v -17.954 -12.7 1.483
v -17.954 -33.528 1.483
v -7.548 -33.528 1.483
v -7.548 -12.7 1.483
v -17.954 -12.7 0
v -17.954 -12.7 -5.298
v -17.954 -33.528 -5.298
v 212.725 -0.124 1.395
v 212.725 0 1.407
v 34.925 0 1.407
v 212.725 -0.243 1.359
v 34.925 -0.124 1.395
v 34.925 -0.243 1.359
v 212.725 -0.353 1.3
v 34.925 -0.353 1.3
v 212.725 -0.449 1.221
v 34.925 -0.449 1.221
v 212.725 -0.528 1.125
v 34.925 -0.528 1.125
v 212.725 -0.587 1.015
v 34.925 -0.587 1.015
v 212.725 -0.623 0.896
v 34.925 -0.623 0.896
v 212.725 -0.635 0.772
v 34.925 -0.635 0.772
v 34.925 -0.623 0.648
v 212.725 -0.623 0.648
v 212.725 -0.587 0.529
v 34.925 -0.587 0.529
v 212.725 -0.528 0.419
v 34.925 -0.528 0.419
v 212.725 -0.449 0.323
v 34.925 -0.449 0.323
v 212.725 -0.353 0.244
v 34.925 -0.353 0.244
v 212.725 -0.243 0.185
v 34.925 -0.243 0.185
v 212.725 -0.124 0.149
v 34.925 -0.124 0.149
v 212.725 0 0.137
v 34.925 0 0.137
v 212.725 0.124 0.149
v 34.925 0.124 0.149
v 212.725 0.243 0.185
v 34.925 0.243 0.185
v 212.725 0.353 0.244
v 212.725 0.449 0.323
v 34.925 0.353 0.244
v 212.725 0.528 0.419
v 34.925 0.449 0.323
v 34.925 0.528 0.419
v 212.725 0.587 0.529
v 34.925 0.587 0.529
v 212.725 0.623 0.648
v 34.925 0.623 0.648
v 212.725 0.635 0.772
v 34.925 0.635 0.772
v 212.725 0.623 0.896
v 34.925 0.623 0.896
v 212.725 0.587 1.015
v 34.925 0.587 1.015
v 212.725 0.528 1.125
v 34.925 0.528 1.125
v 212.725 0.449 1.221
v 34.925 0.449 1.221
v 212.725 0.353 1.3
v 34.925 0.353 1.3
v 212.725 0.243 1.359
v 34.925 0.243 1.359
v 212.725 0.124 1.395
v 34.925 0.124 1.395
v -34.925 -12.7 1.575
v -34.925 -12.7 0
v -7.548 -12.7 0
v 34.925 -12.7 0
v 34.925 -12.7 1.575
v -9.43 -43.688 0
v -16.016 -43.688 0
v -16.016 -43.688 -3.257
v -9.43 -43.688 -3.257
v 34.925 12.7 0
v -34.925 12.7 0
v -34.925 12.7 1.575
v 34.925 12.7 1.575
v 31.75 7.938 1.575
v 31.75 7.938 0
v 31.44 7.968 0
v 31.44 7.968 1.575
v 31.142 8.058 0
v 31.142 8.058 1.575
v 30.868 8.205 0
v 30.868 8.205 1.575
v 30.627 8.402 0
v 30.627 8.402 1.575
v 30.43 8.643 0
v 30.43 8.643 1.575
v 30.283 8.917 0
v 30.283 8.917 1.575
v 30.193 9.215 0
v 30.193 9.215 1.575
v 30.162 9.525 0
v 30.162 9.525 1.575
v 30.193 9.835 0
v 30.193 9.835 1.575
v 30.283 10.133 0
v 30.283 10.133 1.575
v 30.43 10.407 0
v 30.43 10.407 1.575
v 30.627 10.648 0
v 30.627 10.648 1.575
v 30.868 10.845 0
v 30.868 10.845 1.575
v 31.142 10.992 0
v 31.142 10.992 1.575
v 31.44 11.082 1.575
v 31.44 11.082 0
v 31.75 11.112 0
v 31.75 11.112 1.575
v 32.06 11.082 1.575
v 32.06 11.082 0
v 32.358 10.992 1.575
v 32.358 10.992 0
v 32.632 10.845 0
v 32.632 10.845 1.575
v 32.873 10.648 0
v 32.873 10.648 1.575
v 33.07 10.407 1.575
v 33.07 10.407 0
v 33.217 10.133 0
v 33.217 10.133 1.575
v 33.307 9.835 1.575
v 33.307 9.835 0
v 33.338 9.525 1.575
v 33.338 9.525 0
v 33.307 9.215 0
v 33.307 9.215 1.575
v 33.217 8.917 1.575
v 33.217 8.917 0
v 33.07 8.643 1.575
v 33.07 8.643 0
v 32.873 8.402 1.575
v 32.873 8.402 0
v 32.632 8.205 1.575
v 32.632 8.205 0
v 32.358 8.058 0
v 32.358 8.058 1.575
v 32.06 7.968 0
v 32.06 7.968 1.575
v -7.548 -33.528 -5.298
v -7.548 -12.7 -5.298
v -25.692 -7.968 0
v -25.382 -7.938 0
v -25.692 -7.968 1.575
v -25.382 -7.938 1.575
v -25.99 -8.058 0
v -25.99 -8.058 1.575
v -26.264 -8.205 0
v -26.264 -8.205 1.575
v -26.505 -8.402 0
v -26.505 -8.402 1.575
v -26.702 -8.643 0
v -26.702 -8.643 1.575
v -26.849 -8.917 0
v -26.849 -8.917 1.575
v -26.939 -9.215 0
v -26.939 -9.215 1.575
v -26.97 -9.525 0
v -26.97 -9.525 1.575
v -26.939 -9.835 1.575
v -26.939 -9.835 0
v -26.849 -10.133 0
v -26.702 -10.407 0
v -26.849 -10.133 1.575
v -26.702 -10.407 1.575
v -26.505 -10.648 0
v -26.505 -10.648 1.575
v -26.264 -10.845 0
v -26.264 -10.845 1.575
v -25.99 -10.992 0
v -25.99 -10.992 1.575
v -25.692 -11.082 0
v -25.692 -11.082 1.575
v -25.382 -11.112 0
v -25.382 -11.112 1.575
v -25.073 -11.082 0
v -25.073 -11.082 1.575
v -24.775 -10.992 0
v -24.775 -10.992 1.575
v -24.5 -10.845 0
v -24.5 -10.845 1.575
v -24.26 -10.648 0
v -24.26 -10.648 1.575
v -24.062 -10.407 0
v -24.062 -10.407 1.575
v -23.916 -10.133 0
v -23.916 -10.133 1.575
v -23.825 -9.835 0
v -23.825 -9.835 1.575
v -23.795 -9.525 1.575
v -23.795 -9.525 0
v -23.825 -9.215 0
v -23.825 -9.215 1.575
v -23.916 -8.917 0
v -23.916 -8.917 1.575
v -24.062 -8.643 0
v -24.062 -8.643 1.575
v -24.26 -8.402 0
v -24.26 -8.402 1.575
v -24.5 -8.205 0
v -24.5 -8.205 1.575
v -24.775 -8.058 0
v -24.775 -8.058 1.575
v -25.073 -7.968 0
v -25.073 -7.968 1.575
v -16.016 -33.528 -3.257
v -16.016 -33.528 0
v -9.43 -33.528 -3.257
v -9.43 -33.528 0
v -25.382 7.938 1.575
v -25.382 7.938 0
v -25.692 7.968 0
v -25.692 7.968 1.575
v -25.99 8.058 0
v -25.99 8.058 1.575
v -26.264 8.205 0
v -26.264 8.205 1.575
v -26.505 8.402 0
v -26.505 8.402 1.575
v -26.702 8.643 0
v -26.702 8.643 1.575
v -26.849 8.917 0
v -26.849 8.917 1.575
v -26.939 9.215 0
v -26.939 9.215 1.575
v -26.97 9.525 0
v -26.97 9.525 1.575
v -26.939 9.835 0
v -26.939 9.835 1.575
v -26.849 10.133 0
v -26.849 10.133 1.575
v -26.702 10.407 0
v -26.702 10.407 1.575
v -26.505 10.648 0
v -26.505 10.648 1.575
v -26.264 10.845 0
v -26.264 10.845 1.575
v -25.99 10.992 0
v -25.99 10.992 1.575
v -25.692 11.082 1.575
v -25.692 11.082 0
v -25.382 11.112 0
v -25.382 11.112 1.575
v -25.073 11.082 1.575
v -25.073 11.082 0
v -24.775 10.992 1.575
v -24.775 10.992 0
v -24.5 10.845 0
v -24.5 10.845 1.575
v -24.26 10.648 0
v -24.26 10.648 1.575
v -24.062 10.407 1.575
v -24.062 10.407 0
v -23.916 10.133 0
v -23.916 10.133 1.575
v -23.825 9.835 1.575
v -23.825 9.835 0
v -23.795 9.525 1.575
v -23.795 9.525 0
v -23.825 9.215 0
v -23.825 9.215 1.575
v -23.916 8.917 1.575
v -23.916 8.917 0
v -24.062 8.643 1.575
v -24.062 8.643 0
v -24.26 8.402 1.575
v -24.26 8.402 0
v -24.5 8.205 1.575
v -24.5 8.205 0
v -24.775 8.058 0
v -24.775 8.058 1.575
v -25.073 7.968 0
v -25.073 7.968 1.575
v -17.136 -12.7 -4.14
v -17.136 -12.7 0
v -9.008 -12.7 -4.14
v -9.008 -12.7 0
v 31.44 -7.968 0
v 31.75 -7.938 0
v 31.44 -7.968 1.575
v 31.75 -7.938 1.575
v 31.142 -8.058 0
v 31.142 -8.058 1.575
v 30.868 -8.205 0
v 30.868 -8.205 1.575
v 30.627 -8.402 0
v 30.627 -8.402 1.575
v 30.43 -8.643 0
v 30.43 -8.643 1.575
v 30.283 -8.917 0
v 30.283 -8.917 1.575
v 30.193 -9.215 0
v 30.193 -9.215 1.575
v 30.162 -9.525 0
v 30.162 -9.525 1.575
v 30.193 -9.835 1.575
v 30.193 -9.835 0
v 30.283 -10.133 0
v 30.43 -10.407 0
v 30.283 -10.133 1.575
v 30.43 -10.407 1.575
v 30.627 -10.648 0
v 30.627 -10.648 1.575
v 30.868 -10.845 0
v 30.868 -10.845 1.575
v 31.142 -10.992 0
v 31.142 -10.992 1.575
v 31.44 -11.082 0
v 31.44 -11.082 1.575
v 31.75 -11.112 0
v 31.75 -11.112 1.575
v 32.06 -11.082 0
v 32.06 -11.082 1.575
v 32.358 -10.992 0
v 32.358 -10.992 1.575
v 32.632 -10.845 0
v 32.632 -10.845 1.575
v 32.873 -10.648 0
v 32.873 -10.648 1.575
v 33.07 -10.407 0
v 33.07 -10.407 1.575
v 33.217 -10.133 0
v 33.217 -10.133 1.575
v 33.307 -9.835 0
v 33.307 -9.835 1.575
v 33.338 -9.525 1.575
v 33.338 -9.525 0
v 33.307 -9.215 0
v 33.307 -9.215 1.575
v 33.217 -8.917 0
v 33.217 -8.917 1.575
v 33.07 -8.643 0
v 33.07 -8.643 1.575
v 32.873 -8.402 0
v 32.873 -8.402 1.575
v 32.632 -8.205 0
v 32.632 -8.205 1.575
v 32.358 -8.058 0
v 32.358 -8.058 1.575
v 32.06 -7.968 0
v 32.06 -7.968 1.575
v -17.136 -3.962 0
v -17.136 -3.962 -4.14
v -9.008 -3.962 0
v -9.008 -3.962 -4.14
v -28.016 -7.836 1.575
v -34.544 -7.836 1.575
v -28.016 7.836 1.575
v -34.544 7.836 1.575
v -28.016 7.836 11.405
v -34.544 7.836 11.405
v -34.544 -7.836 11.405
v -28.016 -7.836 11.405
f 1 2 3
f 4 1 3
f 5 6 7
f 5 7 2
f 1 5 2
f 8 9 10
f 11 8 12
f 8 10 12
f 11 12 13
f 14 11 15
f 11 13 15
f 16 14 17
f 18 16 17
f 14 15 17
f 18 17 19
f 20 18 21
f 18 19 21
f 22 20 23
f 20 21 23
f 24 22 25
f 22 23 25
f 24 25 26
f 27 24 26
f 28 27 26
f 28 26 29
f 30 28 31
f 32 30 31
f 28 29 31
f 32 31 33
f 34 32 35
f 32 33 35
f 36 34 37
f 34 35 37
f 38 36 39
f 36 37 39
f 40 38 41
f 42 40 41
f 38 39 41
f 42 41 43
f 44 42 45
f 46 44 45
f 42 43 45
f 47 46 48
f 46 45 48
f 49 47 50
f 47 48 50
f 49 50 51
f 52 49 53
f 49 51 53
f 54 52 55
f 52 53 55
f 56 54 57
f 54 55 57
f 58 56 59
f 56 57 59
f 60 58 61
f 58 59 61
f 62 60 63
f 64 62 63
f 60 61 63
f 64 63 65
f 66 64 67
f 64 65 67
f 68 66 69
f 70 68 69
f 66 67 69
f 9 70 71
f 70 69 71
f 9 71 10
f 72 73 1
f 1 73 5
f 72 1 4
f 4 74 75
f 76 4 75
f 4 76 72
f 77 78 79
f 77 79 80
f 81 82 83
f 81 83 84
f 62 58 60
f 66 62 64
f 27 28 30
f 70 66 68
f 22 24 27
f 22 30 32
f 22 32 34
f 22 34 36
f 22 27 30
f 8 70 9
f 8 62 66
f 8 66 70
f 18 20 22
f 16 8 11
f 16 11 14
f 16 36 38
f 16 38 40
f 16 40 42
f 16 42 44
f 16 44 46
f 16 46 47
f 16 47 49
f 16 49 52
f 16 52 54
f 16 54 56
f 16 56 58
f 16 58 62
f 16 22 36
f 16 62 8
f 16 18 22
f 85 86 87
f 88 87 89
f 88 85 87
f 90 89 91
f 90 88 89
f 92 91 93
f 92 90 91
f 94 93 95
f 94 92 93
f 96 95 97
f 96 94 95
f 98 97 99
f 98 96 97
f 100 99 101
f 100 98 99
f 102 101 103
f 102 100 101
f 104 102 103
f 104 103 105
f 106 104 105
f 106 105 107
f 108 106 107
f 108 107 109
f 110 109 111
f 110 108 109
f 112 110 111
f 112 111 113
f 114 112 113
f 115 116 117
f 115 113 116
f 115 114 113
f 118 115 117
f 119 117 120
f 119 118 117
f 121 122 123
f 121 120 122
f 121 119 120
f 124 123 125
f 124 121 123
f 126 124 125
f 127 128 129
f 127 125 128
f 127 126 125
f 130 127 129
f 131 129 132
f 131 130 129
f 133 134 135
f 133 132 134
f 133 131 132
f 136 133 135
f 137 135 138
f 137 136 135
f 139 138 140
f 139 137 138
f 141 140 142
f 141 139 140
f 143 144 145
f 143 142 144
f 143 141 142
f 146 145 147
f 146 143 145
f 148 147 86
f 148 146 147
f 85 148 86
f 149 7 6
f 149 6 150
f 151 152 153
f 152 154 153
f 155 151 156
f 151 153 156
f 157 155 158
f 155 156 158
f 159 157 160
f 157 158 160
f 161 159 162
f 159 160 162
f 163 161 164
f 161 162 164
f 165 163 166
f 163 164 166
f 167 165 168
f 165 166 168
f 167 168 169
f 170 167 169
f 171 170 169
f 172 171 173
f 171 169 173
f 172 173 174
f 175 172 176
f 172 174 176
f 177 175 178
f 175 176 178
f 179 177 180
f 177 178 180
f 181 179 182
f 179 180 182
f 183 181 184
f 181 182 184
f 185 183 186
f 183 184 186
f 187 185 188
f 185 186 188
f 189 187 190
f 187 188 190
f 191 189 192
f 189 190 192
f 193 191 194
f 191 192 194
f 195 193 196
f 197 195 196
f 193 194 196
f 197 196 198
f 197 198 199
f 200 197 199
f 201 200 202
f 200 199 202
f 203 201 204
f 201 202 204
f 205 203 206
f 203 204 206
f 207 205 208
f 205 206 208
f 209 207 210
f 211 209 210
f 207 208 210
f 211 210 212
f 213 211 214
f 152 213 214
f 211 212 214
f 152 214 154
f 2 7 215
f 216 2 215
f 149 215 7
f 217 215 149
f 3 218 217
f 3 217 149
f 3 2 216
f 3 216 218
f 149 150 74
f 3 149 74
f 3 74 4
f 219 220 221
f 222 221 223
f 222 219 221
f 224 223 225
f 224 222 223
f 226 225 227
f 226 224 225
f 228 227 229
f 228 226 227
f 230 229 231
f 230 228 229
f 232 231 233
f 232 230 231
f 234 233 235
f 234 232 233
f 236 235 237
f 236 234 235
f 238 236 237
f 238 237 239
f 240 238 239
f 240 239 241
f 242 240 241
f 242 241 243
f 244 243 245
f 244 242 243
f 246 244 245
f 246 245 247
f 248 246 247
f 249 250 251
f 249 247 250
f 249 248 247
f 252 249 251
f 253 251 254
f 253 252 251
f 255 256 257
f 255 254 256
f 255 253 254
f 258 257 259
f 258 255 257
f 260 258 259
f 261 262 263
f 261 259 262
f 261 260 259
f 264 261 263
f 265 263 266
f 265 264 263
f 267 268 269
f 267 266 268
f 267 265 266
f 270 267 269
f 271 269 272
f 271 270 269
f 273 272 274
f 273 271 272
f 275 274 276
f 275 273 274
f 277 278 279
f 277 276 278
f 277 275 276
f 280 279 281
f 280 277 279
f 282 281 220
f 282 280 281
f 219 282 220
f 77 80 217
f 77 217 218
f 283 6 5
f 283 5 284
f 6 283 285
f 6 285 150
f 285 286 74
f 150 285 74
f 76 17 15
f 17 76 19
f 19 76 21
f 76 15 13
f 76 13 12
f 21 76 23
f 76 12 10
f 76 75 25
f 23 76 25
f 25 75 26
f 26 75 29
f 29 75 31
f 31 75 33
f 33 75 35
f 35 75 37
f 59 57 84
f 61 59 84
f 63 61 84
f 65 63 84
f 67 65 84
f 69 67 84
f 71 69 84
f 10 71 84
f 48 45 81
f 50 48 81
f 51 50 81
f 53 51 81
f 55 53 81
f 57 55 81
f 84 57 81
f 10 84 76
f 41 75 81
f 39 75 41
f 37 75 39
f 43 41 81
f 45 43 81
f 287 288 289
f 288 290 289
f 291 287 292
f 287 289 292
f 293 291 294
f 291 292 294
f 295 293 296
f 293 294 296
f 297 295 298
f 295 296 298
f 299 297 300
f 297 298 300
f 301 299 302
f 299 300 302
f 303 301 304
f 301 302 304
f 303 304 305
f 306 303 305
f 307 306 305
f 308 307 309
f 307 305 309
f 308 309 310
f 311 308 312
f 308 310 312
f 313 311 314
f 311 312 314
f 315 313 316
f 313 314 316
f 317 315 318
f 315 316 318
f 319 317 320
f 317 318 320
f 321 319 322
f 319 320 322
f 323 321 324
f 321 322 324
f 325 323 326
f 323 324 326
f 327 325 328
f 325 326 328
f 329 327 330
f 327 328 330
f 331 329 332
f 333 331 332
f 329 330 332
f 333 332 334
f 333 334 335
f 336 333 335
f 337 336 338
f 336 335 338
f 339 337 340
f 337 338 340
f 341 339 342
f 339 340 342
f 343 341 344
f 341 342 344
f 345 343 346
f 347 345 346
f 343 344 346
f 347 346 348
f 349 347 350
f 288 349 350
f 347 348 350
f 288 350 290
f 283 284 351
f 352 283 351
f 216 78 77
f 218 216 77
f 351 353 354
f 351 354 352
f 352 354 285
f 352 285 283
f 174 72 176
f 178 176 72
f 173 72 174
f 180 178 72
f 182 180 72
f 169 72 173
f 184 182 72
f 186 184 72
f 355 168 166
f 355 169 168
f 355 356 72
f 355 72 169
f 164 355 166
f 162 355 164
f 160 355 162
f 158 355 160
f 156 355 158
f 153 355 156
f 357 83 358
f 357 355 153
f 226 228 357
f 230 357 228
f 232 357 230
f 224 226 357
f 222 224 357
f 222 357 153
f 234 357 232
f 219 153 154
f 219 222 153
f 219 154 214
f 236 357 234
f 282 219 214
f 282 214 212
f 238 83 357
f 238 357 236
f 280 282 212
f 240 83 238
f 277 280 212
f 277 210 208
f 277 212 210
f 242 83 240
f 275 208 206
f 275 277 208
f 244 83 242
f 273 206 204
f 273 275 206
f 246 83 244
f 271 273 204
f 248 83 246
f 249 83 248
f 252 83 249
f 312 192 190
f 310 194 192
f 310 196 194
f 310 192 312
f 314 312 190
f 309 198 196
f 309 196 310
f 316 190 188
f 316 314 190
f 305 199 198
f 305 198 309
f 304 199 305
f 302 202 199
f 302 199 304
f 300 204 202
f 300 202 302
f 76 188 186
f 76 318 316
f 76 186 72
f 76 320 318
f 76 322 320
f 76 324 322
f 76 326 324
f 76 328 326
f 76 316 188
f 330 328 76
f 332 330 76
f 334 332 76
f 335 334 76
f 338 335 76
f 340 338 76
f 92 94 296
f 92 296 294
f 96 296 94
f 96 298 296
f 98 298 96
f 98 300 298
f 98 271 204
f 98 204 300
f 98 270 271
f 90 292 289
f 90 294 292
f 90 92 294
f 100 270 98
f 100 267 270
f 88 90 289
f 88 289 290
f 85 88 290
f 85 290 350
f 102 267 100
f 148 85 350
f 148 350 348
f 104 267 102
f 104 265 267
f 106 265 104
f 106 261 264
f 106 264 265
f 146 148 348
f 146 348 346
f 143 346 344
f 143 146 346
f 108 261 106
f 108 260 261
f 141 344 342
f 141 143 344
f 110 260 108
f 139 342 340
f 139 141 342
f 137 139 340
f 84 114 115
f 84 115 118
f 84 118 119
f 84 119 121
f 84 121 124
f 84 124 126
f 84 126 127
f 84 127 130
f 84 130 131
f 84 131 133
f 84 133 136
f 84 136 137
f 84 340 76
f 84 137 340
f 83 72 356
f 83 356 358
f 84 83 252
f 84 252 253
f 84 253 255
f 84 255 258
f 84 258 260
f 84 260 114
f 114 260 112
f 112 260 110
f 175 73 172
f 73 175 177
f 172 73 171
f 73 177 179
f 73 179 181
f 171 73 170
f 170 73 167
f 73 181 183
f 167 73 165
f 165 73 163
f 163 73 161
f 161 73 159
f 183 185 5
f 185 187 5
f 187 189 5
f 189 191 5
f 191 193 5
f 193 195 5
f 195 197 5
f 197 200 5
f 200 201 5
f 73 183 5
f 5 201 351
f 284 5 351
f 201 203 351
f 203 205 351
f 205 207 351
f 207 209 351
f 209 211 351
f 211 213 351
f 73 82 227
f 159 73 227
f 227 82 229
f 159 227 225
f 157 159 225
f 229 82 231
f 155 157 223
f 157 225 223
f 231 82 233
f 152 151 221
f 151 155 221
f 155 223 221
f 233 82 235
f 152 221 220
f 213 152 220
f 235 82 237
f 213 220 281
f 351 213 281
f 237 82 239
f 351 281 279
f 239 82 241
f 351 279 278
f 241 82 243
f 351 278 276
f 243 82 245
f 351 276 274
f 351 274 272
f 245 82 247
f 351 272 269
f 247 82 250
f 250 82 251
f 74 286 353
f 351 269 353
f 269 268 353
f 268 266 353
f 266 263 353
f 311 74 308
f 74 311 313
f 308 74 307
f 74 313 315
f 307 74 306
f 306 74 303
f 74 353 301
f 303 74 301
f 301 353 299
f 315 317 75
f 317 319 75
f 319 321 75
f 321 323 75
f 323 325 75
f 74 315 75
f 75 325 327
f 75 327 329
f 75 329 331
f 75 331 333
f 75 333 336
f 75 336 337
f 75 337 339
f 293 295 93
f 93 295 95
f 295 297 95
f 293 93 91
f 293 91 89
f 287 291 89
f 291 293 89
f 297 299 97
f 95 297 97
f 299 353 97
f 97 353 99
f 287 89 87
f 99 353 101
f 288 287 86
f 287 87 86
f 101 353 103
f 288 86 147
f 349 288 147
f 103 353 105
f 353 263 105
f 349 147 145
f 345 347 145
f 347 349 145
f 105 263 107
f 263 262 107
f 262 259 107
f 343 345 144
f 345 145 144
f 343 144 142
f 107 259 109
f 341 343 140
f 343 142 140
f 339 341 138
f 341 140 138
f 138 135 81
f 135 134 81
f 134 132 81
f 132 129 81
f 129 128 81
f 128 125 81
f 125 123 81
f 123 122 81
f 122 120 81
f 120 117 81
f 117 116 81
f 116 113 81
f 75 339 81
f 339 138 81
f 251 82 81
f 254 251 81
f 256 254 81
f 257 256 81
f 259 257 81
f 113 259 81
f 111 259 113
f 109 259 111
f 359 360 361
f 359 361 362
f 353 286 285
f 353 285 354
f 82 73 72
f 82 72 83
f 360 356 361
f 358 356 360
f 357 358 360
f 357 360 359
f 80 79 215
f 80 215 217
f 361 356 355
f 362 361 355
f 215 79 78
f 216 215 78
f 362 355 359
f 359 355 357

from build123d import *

# Parameters (mm, degrees)
SKETCH1_W                             = 69.85
SKETCH1_H                             = 25.4
EXTRUDE1_DEPTH                        = 1.5748
F_1_8_0_125_DIAMETER_HOLE1_AT_2_COUNT = 2
F_1_8_0_125_DIAMETER_HOLE1_AT_2_PITCH = 57.13222
SKETCH4_R                             = 0.635
BOSS_EXTRUDE1_DEPTH                   = 177.8
SKETCH5_W                             = 8.128
SKETCH5_H                             = 8.7376
USB_CONNECTOR_DEPTH                   = 4.1402
SKETCH6_W                             = 10.40639215
SKETCH6_H                             = 6.781860105
CHARGER_DEPTH                         = 20.828
SKETCH7_W                             = 6.585703948
SKETCH7_H                             = 3.257259008
BOSS_EXTRUDE2_DEPTH                   = 10.16
SKETCH8_W                             = 6.5278
SKETCH8_H                             = 15.6718
BOSS_EXTRUDE3_DEPTH                   = 9.8298


with BuildPart() as part:
    # Sketch1 → Extrude1 (new body)
    with BuildSketch(Plane.XY):
        Rectangle(SKETCH1_W, SKETCH1_H)
    extrude(amount=EXTRUDE1_DEPTH)

    # Sketch3 → 1/8 (0.125) Diameter Hole1 (revolve, cut)
    with BuildSketch(Plane(origin=(-25.38222, 9.525, 1.5748), x_dir=(0, -1, 0), z_dir=(1, 0, 0))):
        Polygon((0, 0), (0, 16.955866233), (1.5875, 16.002), (1.5875, 0), align=None)
    f_1_8_0_125_diameter_hole1 = revolve(axis=Axis((-25.38222, 9.525, 7.9248), (0, 0, -1)), mode=Mode.SUBTRACT)

    # 1/8 (0.125) Diameter Hole1 at 2: 1/8 (0.125) Diameter Hole1 ×2
    with Locations(*[(i * F_1_8_0_125_DIAMETER_HOLE1_AT_2_PITCH, 0, 0) for i in range(1, F_1_8_0_125_DIAMETER_HOLE1_AT_2_COUNT)]):
        add(f_1_8_0_125_diameter_hole1, mode=Mode.SUBTRACT)

    # Mirror1: 1/8 (0.125) Diameter Hole1 across plane
    add(f_1_8_0_125_diameter_hole1.mirror(Plane.ZX), mode=Mode.SUBTRACT)

    # Mirror1 copy 1 sketch → Mirror1 copy 1 (revolve, cut)
    with BuildSketch(Plane(origin=(31.75, -9.525, 1.5748), x_dir=(0, 1, 0), z_dir=(1, 0, 0))):
        Polygon((0, 0), (0, -16.955866233), (1.5875, -16.002), (1.5875, 0), align=None)
    revolve(axis=Axis((31.75, -9.525, 7.9248), (0, 0, 1)), mode=Mode.SUBTRACT)

    # Sketch4 → Boss-Extrude1 (add)
    with BuildSketch(Plane(origin=(34.925, 0, 0), x_dir=(0, 0, -1), z_dir=(1, 0, 0))):
        with Locations(Location((-0.772028936, 0, 0), (0, 0, 180))):
            Circle(SKETCH4_R)
    extrude(amount=BOSS_EXTRUDE1_DEPTH)

    # Sketch5 → USB Connector (add)
    with BuildSketch(Plane(origin=(0, 0, 0), x_dir=(-1, 0, 0), z_dir=(0, 0, -1))):
        with Locations((13.072066229, -8.3312)):
            Rectangle(SKETCH5_W, SKETCH5_H)
    extrude(amount=USB_CONNECTOR_DEPTH)

    # Sketch6 → Charger (add)
    with BuildSketch(Plane.XZ.offset(12.7)):
        with Locations((-12.751236003, -1.907476131)):
            Rectangle(SKETCH6_W, SKETCH6_H)
    extrude(amount=CHARGER_DEPTH)

    # Sketch7 → Boss-Extrude2 (add)
    with BuildSketch(Plane.XZ.offset(33.528)):
        with Locations((-12.72298233, -1.628596112)):
            Rectangle(SKETCH7_W, SKETCH7_H)
    extrude(amount=BOSS_EXTRUDE2_DEPTH)

    # Sketch8 → Boss-Extrude3 (add)
    with BuildSketch(Plane.XY.offset(1.5748)):
        with Locations((-31.2801, 0)):
            Rectangle(SKETCH8_W, SKETCH8_H)
    extrude(amount=BOSS_EXTRUDE3_DEPTH)


solid = part.part
